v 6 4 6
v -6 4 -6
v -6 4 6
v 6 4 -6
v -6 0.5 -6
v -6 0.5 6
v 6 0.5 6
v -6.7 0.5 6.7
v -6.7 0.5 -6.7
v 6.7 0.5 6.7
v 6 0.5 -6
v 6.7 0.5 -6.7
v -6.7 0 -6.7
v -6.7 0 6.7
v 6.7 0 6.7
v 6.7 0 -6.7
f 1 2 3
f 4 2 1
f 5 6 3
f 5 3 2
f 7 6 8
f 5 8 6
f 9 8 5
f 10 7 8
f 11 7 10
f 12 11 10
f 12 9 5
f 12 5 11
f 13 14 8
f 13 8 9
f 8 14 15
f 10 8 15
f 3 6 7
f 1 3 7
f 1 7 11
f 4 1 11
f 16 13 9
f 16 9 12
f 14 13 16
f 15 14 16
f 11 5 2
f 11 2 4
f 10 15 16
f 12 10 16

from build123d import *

# Parameters (mm, degrees)
SKETCH3_W           = 13.4
SKETCH3_H           = 13.4
BOSS_EXTRUDE2_DEPTH = 0.5
SKETCH4_W           = 12
SKETCH4_H           = 12
BOSS_EXTRUDE3_DEPTH = 4


with BuildPart() as part:
    # Sketch3 → Boss-Extrude2 (new body)
    with BuildSketch(Plane(origin=(0, 0, 0), x_dir=(1, 0, 0), z_dir=(0, 1, 0))):
        Rectangle(SKETCH3_W, SKETCH3_H)
    extrude(amount=BOSS_EXTRUDE2_DEPTH)

    # Sketch4 → Boss-Extrude3 (add)
    with BuildSketch(Plane(origin=(0, 0, 0), x_dir=(1, 0, 0), z_dir=(0, 1, 0))):
        Rectangle(SKETCH4_W, SKETCH4_H)
    extrude(amount=BOSS_EXTRUDE3_DEPTH)


solid = part.part
